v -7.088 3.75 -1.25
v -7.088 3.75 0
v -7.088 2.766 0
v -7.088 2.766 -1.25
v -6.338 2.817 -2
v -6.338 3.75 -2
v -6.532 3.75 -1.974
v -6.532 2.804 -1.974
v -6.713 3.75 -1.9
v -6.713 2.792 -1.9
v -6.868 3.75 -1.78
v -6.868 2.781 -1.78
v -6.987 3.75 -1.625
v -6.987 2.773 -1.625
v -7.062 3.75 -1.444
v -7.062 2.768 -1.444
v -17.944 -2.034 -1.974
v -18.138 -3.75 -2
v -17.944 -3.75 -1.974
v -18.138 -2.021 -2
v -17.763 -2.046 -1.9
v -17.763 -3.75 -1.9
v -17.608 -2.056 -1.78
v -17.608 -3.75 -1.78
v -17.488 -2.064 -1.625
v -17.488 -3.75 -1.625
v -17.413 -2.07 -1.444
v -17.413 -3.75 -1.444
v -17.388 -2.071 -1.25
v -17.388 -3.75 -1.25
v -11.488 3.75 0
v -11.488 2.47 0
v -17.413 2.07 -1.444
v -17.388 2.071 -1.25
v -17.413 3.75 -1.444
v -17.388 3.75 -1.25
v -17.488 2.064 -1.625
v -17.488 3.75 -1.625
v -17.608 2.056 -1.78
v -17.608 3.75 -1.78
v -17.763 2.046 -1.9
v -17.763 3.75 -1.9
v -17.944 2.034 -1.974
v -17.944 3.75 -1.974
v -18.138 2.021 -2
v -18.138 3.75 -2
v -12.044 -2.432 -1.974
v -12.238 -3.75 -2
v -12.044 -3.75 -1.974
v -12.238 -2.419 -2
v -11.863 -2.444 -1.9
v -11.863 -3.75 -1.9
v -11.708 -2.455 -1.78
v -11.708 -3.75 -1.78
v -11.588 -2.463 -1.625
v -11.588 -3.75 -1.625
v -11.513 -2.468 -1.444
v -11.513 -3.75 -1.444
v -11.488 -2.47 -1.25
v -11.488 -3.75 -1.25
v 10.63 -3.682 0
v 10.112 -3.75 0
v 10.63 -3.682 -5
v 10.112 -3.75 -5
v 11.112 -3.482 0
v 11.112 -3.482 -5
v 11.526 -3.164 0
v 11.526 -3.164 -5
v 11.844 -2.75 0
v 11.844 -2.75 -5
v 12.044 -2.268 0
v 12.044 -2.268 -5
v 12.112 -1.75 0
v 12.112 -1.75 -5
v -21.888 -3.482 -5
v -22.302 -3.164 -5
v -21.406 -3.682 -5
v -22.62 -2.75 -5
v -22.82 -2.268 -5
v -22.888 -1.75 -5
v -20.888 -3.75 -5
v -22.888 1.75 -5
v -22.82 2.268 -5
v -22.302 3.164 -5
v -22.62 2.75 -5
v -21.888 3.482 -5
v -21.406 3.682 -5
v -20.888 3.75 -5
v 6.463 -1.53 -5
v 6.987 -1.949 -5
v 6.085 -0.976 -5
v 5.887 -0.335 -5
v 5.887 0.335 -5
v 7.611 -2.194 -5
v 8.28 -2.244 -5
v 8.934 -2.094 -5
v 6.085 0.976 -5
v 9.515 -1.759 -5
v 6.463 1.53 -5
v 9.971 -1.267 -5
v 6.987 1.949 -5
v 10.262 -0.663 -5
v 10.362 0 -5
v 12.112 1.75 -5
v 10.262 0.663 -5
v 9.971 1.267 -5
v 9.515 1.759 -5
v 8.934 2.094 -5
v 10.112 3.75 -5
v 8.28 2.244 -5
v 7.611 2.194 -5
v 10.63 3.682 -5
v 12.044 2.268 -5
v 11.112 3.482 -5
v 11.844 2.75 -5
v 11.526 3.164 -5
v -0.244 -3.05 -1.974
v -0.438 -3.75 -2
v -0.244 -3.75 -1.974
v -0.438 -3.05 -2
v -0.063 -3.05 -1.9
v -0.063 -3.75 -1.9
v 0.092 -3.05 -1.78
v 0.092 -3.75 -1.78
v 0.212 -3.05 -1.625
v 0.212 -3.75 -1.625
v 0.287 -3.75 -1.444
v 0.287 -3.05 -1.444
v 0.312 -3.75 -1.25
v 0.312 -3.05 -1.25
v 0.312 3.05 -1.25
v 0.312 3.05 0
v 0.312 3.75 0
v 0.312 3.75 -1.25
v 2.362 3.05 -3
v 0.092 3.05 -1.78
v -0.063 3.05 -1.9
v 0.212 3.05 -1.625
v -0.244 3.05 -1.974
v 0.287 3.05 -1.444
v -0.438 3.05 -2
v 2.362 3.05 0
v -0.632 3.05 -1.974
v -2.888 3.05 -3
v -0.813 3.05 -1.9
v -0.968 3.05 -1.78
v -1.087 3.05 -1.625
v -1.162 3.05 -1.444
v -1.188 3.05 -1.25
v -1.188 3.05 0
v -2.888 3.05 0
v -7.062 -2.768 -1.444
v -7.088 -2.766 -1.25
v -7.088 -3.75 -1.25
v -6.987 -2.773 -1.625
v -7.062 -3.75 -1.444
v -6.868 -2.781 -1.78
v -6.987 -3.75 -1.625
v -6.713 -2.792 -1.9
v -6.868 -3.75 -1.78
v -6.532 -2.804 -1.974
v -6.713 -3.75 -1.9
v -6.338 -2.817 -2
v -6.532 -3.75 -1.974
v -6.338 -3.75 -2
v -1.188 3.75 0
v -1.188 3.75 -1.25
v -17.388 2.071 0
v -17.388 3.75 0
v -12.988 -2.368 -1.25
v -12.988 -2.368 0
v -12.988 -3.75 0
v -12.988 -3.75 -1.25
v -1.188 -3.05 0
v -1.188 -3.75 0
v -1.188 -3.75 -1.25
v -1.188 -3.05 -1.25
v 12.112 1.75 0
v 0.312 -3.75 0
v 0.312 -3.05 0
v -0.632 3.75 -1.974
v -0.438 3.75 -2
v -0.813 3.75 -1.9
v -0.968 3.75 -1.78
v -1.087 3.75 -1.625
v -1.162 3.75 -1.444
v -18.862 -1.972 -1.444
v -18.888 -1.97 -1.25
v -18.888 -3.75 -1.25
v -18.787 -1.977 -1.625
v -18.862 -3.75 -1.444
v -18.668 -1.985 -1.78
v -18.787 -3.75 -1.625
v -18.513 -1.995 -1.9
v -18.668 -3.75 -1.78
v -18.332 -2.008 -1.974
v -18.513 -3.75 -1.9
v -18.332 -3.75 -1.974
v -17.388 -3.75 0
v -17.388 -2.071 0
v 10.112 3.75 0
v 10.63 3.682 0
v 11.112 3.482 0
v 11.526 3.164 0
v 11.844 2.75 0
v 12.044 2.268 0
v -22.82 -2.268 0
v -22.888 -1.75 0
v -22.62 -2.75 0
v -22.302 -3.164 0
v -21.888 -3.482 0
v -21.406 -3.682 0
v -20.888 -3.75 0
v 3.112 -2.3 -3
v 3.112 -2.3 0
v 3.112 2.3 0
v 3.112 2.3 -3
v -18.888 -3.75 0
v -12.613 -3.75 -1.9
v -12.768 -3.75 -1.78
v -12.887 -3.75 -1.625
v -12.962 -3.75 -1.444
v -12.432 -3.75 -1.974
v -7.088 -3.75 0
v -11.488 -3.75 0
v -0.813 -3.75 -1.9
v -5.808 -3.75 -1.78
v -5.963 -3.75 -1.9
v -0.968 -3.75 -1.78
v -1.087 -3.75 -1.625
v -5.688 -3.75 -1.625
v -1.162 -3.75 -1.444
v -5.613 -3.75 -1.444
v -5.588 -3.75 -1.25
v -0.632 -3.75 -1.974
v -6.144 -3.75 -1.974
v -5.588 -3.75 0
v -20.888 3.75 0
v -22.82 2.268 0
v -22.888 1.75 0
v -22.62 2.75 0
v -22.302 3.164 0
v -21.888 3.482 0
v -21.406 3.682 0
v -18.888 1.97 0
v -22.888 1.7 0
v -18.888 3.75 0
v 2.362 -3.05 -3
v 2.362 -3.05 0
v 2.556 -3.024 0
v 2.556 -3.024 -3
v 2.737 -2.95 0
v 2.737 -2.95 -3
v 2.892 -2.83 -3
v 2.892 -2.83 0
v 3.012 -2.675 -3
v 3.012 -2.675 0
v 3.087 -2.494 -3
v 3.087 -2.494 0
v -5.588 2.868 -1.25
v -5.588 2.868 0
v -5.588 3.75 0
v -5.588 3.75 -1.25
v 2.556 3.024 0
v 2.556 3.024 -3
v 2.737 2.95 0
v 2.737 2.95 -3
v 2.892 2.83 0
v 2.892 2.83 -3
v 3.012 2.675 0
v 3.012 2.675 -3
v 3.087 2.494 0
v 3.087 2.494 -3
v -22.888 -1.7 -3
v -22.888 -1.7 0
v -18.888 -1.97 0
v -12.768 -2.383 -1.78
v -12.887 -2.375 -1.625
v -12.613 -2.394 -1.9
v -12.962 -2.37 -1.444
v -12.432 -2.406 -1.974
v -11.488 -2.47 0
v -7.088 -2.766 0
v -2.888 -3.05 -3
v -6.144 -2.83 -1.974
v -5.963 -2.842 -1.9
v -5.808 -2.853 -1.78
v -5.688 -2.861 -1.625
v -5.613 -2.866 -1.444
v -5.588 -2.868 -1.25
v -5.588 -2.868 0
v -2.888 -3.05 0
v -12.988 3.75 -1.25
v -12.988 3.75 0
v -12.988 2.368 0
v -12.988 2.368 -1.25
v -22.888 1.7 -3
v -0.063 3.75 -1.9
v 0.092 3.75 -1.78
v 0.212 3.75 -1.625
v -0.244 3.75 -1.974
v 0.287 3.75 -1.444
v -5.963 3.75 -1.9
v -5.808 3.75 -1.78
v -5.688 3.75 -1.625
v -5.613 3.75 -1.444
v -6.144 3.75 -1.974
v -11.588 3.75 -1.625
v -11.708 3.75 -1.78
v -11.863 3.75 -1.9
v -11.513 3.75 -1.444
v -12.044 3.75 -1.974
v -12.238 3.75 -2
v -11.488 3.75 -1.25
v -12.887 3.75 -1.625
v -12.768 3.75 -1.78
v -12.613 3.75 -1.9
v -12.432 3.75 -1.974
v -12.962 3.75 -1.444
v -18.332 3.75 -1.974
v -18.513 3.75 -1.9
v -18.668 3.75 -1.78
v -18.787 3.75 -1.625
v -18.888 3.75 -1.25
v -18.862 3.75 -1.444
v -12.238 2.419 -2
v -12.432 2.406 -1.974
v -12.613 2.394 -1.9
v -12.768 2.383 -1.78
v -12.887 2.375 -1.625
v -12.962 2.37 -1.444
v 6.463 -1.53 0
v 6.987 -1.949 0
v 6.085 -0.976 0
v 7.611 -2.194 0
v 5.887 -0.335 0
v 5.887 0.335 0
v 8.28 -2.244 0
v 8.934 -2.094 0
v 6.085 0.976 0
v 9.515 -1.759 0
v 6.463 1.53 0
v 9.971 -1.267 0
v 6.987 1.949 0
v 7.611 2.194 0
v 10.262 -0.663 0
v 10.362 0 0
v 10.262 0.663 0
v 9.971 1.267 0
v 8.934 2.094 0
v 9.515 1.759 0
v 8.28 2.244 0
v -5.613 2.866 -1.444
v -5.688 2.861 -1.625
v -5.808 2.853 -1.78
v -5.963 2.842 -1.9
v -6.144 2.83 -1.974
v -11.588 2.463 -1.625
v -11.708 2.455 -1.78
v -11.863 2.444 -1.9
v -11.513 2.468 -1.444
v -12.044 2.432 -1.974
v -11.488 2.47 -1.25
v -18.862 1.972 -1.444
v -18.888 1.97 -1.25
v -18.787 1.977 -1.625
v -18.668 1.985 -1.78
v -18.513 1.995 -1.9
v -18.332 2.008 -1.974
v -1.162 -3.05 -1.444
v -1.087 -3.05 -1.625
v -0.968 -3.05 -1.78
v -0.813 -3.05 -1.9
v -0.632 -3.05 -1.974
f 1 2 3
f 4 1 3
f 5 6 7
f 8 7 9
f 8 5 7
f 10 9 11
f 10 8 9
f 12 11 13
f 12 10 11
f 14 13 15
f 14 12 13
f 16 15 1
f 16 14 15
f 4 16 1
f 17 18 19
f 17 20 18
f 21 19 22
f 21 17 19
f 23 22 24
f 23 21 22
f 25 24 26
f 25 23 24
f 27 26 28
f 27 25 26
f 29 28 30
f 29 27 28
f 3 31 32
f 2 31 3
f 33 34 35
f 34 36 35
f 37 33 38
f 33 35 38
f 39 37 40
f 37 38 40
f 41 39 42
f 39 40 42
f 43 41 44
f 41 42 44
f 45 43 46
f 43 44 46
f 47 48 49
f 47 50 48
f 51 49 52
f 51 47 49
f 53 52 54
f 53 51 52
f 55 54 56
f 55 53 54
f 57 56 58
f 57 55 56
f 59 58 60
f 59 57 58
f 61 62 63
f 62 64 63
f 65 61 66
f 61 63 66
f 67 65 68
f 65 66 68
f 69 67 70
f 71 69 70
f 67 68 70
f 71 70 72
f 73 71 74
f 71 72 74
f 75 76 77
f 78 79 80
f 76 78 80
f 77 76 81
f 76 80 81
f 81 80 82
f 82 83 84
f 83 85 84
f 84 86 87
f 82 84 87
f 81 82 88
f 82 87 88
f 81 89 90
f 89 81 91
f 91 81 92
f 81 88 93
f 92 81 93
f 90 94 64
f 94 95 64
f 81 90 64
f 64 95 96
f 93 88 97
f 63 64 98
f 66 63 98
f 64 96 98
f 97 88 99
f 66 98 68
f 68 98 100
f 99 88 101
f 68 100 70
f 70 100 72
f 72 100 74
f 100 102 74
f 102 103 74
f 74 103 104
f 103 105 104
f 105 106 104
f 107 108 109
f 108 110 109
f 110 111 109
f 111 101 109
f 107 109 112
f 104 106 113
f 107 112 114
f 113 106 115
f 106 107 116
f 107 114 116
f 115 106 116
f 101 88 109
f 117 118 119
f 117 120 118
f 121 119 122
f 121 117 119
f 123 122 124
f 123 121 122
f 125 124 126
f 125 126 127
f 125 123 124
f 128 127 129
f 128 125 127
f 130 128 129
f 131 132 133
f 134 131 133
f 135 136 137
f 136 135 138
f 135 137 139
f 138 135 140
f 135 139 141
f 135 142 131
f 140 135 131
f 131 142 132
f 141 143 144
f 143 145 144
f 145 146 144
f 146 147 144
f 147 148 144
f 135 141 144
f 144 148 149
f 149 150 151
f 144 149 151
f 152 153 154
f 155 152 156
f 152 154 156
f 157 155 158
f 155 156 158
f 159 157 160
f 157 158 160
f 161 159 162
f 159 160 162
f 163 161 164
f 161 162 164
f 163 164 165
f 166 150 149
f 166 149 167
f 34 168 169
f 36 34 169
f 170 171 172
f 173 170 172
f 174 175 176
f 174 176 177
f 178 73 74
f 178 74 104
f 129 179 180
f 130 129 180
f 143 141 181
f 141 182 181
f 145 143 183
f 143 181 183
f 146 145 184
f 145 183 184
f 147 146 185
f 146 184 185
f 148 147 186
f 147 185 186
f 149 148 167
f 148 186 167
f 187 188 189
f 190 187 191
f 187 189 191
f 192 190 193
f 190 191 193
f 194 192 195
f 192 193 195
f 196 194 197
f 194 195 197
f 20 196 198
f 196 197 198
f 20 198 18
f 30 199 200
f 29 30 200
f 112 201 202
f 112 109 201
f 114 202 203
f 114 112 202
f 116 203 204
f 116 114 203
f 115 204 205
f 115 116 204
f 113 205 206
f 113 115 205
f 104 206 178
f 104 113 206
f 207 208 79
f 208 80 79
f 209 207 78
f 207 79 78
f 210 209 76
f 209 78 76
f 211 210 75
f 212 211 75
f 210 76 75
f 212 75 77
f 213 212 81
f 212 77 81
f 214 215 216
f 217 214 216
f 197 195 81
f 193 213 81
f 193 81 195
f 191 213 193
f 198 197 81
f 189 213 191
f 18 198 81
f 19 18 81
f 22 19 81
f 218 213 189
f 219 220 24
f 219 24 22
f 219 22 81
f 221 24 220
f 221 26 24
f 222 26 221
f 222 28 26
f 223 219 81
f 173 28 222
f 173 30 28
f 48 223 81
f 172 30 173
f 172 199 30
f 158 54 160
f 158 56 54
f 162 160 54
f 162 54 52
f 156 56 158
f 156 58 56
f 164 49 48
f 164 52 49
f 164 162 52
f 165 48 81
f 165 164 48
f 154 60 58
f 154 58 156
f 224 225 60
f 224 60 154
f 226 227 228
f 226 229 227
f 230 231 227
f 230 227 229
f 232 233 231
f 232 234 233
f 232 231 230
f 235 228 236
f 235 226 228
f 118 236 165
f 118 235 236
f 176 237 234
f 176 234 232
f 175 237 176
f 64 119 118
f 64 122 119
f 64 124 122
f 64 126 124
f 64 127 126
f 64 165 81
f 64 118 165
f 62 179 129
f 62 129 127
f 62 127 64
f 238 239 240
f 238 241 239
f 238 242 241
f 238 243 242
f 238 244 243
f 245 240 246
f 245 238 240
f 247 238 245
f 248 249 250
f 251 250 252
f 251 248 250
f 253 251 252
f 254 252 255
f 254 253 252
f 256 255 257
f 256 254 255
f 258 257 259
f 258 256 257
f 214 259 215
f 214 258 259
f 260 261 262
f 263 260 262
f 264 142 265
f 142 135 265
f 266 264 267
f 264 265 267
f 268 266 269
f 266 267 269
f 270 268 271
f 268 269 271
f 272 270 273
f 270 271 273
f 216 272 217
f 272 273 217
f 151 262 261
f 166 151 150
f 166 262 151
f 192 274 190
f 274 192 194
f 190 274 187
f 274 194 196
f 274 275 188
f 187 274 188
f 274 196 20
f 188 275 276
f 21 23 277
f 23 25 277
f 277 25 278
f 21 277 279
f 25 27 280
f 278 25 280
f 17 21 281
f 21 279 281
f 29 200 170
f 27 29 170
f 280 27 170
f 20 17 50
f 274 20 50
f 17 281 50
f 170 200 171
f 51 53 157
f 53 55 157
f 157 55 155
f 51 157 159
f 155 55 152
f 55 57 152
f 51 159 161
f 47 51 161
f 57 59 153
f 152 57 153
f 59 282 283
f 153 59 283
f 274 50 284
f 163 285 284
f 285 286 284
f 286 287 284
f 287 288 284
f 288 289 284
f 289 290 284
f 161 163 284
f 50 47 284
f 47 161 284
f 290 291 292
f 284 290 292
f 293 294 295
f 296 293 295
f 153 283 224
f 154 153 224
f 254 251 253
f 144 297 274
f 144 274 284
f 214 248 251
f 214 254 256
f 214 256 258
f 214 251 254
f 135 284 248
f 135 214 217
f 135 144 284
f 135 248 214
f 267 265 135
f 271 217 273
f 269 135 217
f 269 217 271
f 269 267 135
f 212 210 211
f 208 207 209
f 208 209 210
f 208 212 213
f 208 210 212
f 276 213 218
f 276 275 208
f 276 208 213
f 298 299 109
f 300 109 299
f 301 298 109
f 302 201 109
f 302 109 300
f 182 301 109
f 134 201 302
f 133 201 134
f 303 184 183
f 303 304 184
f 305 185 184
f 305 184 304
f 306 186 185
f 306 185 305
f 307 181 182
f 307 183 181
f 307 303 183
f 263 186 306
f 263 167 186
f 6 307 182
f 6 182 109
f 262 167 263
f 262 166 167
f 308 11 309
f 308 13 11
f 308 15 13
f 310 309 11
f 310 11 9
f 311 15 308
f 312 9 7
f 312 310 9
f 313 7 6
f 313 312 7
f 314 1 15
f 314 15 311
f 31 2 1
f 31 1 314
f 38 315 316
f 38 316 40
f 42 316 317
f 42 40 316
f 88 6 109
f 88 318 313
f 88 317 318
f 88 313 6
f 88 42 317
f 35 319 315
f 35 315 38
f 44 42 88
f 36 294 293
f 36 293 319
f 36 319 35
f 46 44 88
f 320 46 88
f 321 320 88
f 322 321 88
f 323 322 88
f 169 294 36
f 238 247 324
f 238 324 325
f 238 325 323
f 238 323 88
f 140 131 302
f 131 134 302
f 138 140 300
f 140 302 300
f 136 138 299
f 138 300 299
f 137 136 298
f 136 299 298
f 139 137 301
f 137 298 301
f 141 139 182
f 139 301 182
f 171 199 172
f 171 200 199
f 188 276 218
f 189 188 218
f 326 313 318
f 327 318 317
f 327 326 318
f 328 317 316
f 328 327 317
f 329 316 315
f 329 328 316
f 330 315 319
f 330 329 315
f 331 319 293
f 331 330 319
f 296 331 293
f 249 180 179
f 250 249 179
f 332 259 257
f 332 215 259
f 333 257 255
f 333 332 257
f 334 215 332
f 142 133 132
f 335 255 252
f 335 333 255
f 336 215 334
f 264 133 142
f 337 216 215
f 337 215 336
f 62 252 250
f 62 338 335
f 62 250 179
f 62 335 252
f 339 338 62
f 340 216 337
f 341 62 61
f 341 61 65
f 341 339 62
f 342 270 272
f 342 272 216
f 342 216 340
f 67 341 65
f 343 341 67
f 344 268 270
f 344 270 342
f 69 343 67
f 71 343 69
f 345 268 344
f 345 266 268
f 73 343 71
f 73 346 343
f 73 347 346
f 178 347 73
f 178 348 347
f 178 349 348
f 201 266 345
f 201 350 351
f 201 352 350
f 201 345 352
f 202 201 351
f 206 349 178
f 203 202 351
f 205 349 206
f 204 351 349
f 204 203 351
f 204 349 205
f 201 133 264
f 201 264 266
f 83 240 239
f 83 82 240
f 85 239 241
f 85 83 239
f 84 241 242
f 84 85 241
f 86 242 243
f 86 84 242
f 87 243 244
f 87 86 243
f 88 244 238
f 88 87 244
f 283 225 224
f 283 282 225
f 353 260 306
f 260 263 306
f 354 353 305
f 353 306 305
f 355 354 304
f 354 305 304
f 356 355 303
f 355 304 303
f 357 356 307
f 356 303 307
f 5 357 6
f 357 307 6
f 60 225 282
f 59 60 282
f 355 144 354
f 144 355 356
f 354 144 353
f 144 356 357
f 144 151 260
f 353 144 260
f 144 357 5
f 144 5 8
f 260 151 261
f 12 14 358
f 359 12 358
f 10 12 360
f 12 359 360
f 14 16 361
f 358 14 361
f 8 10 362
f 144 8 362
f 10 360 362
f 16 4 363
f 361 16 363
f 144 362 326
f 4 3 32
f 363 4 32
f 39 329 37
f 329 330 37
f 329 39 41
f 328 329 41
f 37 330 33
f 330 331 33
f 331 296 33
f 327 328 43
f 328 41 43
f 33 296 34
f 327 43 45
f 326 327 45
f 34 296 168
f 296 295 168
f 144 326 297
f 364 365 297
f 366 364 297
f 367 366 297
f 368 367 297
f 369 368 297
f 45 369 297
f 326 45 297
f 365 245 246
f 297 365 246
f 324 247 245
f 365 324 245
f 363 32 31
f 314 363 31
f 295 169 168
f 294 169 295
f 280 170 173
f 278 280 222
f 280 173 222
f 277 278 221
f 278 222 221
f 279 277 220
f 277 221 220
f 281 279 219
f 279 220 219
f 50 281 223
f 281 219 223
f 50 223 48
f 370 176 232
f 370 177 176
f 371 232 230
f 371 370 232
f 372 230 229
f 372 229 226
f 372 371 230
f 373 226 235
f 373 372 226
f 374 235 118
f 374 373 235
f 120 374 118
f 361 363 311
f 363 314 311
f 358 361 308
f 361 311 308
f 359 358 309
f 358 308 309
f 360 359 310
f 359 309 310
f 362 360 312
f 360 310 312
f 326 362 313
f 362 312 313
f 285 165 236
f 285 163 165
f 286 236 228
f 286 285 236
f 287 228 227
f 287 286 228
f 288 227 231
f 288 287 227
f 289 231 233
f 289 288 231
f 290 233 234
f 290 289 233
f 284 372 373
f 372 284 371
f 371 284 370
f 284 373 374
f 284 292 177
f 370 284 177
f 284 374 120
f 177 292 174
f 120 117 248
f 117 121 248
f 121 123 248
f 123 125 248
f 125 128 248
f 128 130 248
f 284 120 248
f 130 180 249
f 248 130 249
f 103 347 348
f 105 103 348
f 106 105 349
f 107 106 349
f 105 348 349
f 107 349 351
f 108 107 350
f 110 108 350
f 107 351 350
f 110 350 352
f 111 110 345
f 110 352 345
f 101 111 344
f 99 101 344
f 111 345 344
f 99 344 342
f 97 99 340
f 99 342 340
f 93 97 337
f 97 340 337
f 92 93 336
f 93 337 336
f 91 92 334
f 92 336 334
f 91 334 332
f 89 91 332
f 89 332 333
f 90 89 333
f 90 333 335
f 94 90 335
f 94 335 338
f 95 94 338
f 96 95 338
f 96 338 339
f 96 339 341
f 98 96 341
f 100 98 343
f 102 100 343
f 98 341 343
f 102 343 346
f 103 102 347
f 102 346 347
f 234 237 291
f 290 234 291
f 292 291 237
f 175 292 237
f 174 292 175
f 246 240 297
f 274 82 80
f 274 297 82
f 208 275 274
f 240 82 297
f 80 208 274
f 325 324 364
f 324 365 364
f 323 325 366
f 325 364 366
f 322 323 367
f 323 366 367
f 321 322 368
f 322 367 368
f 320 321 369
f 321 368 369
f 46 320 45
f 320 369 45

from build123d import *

# Parameters (mm, degrees)
F0_W     = 1.5
F0_H     = 0.7
F0_R     = 2.25
F0_H_2   = 6.1
F0_W_2   = 2.8
F1_DEPTH = 5
F2_DEPTH = 3
F3_DEPTH = 2
F4_R     = 0.74999
F5_R     = 2


# Not quite as in the source:
# - a fillet or chamfer is up to 0.001 mm smaller than in the source, because OpenCascade refuses the exact size


with BuildPart() as f1:
    # F0 (on Top) → F1 (new body)
    with BuildSketch(Plane.XY):
        Polygon((-18.8879279066, 3.75), (-22.8879279066, 3.75), (-22.8879279066, 1.7), (-18.8879279066, 1.97), align=None)
        Polygon((-17.3879279066, 3.75), (-18.8879279066, 3.75), (-18.8879279066, 1.97), (-17.3879279066, 2.07125), align=None)
        Polygon((-18.8879279066, 1.97), (-22.8879279066, 1.7), (-22.8879279066, -1.7), (-18.8879279066, -1.97), align=None)
        Polygon((-12.9879279066, 3.75), (-17.3879279066, 3.75), (-17.3879279066, 2.07125), (-12.9879279066, 2.36825), align=None)
        Polygon((-18.8879279066, -1.97), (-22.8879279066, -1.7), (-22.8879279066, -3.75), (-18.8879279066, -3.75), align=None)
        Polygon((-11.4879279066, 3.75), (-12.9879279066, 3.75), (-12.9879279066, 2.36825), (-11.4879279066, 2.4695), align=None)
        Polygon((-17.3879279066, -2.07125), (-18.8879279066, -1.97), (-18.8879279066, -3.75), (-17.3879279066, -3.75), align=None)
        Polygon((-7.0879279066, 3.75), (-11.4879279066, 3.75), (-11.4879279066, 2.4695), (-7.0879279066, 2.7665), align=None)
        Polygon((-12.9879279066, -2.36825), (-17.3879279066, -2.07125), (-17.3879279066, -3.75), (-12.9879279066, -3.75), align=None)
        Polygon((-5.5879279066, 3.75), (-7.0879279066, 3.75), (-7.0879279066, 2.7665), (-5.5879279066, 2.86775), align=None)
        Polygon((-11.4879279066, -2.4695), (-12.9879279066, -2.36825), (-12.9879279066, -3.75), (-11.4879279066, -3.75), align=None)
        Polygon((-1.1879279066, 3.75), (-5.5879279066, 3.75), (-5.5879279066, 2.86775), (-2.8879279066, 3.05), (-1.1879279066, 3.05), align=None)
        Polygon((-7.0879279066, -2.7665), (-11.4879279066, -2.4695), (-11.4879279066, -3.75), (-7.0879279066, -3.75), align=None)
        with Locations((-0.4379279066, 3.4)):
            Rectangle(F0_W, F0_H)
        Polygon((-5.5879279066, -2.86775), (-7.0879279066, -2.7665), (-7.0879279066, -3.75), (-5.5879279066, -3.75), align=None)
        Polygon((12.1120720934, 3.75), (0.3120720934, 3.75), (0.3120720934, 3.05), (3.1120720934, 3.05), (3.1120720934, -3.05), (0.3120720934, -3.05), (0.3120720934, -3.75), (12.1120720934, -3.75), align=None)
        with Locations((8.1120720934, 0)):
            Circle(F0_R, mode=Mode.SUBTRACT)
        Polygon((-2.8879279066, -3.05), (-5.5879279066, -2.86775), (-5.5879279066, -3.75), (-1.1879279066, -3.75), (-1.1879279066, -3.05), align=None)
        with Locations((-0.4379279066, -3.4)):
            Rectangle(F0_W, F0_H)
        with Locations((-0.4379279066, 0)):
            Rectangle(F0_W, F0_H_2)
        Polygon((-5.5879279066, 2.86775), (-7.0879279066, 2.7665), (-7.0879279066, -2.7665), (-5.5879279066, -2.86775), align=None)
        Polygon((-17.3879279066, 2.07125), (-18.8879279066, 1.97), (-18.8879279066, -1.97), (-17.3879279066, -2.07125), align=None)
        Polygon((-12.9879279066, 2.36825), (-17.3879279066, 2.07125), (-17.3879279066, -2.07125), (-12.9879279066, -2.36825), align=None)
        Polygon((-7.0879279066, 2.7665), (-11.4879279066, 2.4695), (-11.4879279066, -2.4695), (-7.0879279066, -2.7665), align=None)
        Polygon((-11.4879279066, 2.4695), (-12.9879279066, 2.36825), (-12.9879279066, -2.36825), (-11.4879279066, -2.4695), align=None)
        Polygon((-2.8879279066, 3.05), (-5.5879279066, 2.86775), (-5.5879279066, -2.86775), (-2.8879279066, -3.05), (-1.1879279066, -3.05), (-1.1879279066, 3.05), align=None)
        with Locations((1.7120720934, 0)):
            Rectangle(F0_W_2, F0_H_2)
    extrude(amount=-F1_DEPTH)

    # F0 (on Top) → F2 (cut)
    with BuildSketch(Plane.XY):
        Polygon((-18.8879279066, 1.97), (-22.8879279066, 1.7), (-22.8879279066, -1.7), (-18.8879279066, -1.97), align=None)
        Polygon((-17.3879279066, 2.07125), (-18.8879279066, 1.97), (-18.8879279066, -1.97), (-17.3879279066, -2.07125), align=None)
        Polygon((-12.9879279066, 2.36825), (-17.3879279066, 2.07125), (-17.3879279066, -2.07125), (-12.9879279066, -2.36825), align=None)
        Polygon((-11.4879279066, 2.4695), (-12.9879279066, 2.36825), (-12.9879279066, -2.36825), (-11.4879279066, -2.4695), align=None)
        Polygon((-7.0879279066, 2.7665), (-11.4879279066, 2.4695), (-11.4879279066, -2.4695), (-7.0879279066, -2.7665), align=None)
        Polygon((-5.5879279066, 2.86775), (-7.0879279066, 2.7665), (-7.0879279066, -2.7665), (-5.5879279066, -2.86775), align=None)
        Polygon((-2.8879279066, 3.05), (-5.5879279066, 2.86775), (-5.5879279066, -2.86775), (-2.8879279066, -3.05), (-1.1879279066, -3.05), (-1.1879279066, 3.05), align=None)
        with Locations((-0.4379279066, 0)):
            Rectangle(F0_W, F0_H_2)
        with Locations((1.7120720934, 0)):
            Rectangle(F0_W_2, F0_H_2)
    extrude(amount=-F2_DEPTH, mode=Mode.SUBTRACT)

    # F0 (on Top) → F3 (cut)
    with BuildSketch(Plane.XY):
        Polygon((-17.3879279066, 3.75), (-18.8879279066, 3.75), (-18.8879279066, 1.97), (-17.3879279066, 2.07125), align=None)
        Polygon((-11.4879279066, 3.75), (-12.9879279066, 3.75), (-12.9879279066, 2.36825), (-11.4879279066, 2.4695), align=None)
        Polygon((-5.5879279066, 3.75), (-7.0879279066, 3.75), (-7.0879279066, 2.7665), (-5.5879279066, 2.86775), align=None)
        with Locations((-0.4379279066, -3.4)):
            Rectangle(F0_W, F0_H)
        Polygon((-17.3879279066, -2.07125), (-18.8879279066, -1.97), (-18.8879279066, -3.75), (-17.3879279066, -3.75), align=None)
        Polygon((-11.4879279066, -2.4695), (-12.9879279066, -2.36825), (-12.9879279066, -3.75), (-11.4879279066, -3.75), align=None)
        Polygon((-5.5879279066, -2.86775), (-7.0879279066, -2.7665), (-7.0879279066, -3.75), (-5.5879279066, -3.75), align=None)
        with Locations((-0.4379279066, 3.4)):
            Rectangle(F0_W, F0_H)
    extrude(amount=-F3_DEPTH, mode=Mode.SUBTRACT)

    # F4 (radius 0.75 in the source; OpenCascade refuses exactly that, so slightly less here)
    f4_edges = [f1.edges().sort_by_distance(p)[0] for p in [
        (-17.387928, -2.910625, -2),
        (-11.487928, -3.10975, -2),
        (-5.587928, -3.308875, -2),
        (0.312072, -3.4, -2),
        (-18.887928, -2.86, -2),
        (-12.987928, -3.059125, -2),
        (-7.087928, -3.25825, -2),
        (-1.187928, -3.4, -2),
        (-18.887928, 2.86, -2),
        (-12.987928, 3.059125, -2),
        (-7.087928, 3.25825, -2),
        (-1.187928, 3.4, -2),
        (-17.387928, 2.910625, -2),
        (-11.487928, 3.10975, -2),
        (-5.587928, 3.308875, -2),
        (0.312072, 3.4, -2),
        (3.112072, 3.05, -1.5),
        (3.112072, -3.05, -1.5),
    ]]
    fillet(f4_edges, radius=F4_R)

    # F5
    f5_edges = [f1.edges().sort_by_distance(p)[0] for p in [
        (-22.887928, -3.75, -2.5),
        (-22.887928, 3.75, -2.5),
        (12.112072, -3.75, -2.5),
        (12.112072, 3.75, -2.5),
    ]]
    fillet(f5_edges, radius=F5_R)


solid = f1.part
